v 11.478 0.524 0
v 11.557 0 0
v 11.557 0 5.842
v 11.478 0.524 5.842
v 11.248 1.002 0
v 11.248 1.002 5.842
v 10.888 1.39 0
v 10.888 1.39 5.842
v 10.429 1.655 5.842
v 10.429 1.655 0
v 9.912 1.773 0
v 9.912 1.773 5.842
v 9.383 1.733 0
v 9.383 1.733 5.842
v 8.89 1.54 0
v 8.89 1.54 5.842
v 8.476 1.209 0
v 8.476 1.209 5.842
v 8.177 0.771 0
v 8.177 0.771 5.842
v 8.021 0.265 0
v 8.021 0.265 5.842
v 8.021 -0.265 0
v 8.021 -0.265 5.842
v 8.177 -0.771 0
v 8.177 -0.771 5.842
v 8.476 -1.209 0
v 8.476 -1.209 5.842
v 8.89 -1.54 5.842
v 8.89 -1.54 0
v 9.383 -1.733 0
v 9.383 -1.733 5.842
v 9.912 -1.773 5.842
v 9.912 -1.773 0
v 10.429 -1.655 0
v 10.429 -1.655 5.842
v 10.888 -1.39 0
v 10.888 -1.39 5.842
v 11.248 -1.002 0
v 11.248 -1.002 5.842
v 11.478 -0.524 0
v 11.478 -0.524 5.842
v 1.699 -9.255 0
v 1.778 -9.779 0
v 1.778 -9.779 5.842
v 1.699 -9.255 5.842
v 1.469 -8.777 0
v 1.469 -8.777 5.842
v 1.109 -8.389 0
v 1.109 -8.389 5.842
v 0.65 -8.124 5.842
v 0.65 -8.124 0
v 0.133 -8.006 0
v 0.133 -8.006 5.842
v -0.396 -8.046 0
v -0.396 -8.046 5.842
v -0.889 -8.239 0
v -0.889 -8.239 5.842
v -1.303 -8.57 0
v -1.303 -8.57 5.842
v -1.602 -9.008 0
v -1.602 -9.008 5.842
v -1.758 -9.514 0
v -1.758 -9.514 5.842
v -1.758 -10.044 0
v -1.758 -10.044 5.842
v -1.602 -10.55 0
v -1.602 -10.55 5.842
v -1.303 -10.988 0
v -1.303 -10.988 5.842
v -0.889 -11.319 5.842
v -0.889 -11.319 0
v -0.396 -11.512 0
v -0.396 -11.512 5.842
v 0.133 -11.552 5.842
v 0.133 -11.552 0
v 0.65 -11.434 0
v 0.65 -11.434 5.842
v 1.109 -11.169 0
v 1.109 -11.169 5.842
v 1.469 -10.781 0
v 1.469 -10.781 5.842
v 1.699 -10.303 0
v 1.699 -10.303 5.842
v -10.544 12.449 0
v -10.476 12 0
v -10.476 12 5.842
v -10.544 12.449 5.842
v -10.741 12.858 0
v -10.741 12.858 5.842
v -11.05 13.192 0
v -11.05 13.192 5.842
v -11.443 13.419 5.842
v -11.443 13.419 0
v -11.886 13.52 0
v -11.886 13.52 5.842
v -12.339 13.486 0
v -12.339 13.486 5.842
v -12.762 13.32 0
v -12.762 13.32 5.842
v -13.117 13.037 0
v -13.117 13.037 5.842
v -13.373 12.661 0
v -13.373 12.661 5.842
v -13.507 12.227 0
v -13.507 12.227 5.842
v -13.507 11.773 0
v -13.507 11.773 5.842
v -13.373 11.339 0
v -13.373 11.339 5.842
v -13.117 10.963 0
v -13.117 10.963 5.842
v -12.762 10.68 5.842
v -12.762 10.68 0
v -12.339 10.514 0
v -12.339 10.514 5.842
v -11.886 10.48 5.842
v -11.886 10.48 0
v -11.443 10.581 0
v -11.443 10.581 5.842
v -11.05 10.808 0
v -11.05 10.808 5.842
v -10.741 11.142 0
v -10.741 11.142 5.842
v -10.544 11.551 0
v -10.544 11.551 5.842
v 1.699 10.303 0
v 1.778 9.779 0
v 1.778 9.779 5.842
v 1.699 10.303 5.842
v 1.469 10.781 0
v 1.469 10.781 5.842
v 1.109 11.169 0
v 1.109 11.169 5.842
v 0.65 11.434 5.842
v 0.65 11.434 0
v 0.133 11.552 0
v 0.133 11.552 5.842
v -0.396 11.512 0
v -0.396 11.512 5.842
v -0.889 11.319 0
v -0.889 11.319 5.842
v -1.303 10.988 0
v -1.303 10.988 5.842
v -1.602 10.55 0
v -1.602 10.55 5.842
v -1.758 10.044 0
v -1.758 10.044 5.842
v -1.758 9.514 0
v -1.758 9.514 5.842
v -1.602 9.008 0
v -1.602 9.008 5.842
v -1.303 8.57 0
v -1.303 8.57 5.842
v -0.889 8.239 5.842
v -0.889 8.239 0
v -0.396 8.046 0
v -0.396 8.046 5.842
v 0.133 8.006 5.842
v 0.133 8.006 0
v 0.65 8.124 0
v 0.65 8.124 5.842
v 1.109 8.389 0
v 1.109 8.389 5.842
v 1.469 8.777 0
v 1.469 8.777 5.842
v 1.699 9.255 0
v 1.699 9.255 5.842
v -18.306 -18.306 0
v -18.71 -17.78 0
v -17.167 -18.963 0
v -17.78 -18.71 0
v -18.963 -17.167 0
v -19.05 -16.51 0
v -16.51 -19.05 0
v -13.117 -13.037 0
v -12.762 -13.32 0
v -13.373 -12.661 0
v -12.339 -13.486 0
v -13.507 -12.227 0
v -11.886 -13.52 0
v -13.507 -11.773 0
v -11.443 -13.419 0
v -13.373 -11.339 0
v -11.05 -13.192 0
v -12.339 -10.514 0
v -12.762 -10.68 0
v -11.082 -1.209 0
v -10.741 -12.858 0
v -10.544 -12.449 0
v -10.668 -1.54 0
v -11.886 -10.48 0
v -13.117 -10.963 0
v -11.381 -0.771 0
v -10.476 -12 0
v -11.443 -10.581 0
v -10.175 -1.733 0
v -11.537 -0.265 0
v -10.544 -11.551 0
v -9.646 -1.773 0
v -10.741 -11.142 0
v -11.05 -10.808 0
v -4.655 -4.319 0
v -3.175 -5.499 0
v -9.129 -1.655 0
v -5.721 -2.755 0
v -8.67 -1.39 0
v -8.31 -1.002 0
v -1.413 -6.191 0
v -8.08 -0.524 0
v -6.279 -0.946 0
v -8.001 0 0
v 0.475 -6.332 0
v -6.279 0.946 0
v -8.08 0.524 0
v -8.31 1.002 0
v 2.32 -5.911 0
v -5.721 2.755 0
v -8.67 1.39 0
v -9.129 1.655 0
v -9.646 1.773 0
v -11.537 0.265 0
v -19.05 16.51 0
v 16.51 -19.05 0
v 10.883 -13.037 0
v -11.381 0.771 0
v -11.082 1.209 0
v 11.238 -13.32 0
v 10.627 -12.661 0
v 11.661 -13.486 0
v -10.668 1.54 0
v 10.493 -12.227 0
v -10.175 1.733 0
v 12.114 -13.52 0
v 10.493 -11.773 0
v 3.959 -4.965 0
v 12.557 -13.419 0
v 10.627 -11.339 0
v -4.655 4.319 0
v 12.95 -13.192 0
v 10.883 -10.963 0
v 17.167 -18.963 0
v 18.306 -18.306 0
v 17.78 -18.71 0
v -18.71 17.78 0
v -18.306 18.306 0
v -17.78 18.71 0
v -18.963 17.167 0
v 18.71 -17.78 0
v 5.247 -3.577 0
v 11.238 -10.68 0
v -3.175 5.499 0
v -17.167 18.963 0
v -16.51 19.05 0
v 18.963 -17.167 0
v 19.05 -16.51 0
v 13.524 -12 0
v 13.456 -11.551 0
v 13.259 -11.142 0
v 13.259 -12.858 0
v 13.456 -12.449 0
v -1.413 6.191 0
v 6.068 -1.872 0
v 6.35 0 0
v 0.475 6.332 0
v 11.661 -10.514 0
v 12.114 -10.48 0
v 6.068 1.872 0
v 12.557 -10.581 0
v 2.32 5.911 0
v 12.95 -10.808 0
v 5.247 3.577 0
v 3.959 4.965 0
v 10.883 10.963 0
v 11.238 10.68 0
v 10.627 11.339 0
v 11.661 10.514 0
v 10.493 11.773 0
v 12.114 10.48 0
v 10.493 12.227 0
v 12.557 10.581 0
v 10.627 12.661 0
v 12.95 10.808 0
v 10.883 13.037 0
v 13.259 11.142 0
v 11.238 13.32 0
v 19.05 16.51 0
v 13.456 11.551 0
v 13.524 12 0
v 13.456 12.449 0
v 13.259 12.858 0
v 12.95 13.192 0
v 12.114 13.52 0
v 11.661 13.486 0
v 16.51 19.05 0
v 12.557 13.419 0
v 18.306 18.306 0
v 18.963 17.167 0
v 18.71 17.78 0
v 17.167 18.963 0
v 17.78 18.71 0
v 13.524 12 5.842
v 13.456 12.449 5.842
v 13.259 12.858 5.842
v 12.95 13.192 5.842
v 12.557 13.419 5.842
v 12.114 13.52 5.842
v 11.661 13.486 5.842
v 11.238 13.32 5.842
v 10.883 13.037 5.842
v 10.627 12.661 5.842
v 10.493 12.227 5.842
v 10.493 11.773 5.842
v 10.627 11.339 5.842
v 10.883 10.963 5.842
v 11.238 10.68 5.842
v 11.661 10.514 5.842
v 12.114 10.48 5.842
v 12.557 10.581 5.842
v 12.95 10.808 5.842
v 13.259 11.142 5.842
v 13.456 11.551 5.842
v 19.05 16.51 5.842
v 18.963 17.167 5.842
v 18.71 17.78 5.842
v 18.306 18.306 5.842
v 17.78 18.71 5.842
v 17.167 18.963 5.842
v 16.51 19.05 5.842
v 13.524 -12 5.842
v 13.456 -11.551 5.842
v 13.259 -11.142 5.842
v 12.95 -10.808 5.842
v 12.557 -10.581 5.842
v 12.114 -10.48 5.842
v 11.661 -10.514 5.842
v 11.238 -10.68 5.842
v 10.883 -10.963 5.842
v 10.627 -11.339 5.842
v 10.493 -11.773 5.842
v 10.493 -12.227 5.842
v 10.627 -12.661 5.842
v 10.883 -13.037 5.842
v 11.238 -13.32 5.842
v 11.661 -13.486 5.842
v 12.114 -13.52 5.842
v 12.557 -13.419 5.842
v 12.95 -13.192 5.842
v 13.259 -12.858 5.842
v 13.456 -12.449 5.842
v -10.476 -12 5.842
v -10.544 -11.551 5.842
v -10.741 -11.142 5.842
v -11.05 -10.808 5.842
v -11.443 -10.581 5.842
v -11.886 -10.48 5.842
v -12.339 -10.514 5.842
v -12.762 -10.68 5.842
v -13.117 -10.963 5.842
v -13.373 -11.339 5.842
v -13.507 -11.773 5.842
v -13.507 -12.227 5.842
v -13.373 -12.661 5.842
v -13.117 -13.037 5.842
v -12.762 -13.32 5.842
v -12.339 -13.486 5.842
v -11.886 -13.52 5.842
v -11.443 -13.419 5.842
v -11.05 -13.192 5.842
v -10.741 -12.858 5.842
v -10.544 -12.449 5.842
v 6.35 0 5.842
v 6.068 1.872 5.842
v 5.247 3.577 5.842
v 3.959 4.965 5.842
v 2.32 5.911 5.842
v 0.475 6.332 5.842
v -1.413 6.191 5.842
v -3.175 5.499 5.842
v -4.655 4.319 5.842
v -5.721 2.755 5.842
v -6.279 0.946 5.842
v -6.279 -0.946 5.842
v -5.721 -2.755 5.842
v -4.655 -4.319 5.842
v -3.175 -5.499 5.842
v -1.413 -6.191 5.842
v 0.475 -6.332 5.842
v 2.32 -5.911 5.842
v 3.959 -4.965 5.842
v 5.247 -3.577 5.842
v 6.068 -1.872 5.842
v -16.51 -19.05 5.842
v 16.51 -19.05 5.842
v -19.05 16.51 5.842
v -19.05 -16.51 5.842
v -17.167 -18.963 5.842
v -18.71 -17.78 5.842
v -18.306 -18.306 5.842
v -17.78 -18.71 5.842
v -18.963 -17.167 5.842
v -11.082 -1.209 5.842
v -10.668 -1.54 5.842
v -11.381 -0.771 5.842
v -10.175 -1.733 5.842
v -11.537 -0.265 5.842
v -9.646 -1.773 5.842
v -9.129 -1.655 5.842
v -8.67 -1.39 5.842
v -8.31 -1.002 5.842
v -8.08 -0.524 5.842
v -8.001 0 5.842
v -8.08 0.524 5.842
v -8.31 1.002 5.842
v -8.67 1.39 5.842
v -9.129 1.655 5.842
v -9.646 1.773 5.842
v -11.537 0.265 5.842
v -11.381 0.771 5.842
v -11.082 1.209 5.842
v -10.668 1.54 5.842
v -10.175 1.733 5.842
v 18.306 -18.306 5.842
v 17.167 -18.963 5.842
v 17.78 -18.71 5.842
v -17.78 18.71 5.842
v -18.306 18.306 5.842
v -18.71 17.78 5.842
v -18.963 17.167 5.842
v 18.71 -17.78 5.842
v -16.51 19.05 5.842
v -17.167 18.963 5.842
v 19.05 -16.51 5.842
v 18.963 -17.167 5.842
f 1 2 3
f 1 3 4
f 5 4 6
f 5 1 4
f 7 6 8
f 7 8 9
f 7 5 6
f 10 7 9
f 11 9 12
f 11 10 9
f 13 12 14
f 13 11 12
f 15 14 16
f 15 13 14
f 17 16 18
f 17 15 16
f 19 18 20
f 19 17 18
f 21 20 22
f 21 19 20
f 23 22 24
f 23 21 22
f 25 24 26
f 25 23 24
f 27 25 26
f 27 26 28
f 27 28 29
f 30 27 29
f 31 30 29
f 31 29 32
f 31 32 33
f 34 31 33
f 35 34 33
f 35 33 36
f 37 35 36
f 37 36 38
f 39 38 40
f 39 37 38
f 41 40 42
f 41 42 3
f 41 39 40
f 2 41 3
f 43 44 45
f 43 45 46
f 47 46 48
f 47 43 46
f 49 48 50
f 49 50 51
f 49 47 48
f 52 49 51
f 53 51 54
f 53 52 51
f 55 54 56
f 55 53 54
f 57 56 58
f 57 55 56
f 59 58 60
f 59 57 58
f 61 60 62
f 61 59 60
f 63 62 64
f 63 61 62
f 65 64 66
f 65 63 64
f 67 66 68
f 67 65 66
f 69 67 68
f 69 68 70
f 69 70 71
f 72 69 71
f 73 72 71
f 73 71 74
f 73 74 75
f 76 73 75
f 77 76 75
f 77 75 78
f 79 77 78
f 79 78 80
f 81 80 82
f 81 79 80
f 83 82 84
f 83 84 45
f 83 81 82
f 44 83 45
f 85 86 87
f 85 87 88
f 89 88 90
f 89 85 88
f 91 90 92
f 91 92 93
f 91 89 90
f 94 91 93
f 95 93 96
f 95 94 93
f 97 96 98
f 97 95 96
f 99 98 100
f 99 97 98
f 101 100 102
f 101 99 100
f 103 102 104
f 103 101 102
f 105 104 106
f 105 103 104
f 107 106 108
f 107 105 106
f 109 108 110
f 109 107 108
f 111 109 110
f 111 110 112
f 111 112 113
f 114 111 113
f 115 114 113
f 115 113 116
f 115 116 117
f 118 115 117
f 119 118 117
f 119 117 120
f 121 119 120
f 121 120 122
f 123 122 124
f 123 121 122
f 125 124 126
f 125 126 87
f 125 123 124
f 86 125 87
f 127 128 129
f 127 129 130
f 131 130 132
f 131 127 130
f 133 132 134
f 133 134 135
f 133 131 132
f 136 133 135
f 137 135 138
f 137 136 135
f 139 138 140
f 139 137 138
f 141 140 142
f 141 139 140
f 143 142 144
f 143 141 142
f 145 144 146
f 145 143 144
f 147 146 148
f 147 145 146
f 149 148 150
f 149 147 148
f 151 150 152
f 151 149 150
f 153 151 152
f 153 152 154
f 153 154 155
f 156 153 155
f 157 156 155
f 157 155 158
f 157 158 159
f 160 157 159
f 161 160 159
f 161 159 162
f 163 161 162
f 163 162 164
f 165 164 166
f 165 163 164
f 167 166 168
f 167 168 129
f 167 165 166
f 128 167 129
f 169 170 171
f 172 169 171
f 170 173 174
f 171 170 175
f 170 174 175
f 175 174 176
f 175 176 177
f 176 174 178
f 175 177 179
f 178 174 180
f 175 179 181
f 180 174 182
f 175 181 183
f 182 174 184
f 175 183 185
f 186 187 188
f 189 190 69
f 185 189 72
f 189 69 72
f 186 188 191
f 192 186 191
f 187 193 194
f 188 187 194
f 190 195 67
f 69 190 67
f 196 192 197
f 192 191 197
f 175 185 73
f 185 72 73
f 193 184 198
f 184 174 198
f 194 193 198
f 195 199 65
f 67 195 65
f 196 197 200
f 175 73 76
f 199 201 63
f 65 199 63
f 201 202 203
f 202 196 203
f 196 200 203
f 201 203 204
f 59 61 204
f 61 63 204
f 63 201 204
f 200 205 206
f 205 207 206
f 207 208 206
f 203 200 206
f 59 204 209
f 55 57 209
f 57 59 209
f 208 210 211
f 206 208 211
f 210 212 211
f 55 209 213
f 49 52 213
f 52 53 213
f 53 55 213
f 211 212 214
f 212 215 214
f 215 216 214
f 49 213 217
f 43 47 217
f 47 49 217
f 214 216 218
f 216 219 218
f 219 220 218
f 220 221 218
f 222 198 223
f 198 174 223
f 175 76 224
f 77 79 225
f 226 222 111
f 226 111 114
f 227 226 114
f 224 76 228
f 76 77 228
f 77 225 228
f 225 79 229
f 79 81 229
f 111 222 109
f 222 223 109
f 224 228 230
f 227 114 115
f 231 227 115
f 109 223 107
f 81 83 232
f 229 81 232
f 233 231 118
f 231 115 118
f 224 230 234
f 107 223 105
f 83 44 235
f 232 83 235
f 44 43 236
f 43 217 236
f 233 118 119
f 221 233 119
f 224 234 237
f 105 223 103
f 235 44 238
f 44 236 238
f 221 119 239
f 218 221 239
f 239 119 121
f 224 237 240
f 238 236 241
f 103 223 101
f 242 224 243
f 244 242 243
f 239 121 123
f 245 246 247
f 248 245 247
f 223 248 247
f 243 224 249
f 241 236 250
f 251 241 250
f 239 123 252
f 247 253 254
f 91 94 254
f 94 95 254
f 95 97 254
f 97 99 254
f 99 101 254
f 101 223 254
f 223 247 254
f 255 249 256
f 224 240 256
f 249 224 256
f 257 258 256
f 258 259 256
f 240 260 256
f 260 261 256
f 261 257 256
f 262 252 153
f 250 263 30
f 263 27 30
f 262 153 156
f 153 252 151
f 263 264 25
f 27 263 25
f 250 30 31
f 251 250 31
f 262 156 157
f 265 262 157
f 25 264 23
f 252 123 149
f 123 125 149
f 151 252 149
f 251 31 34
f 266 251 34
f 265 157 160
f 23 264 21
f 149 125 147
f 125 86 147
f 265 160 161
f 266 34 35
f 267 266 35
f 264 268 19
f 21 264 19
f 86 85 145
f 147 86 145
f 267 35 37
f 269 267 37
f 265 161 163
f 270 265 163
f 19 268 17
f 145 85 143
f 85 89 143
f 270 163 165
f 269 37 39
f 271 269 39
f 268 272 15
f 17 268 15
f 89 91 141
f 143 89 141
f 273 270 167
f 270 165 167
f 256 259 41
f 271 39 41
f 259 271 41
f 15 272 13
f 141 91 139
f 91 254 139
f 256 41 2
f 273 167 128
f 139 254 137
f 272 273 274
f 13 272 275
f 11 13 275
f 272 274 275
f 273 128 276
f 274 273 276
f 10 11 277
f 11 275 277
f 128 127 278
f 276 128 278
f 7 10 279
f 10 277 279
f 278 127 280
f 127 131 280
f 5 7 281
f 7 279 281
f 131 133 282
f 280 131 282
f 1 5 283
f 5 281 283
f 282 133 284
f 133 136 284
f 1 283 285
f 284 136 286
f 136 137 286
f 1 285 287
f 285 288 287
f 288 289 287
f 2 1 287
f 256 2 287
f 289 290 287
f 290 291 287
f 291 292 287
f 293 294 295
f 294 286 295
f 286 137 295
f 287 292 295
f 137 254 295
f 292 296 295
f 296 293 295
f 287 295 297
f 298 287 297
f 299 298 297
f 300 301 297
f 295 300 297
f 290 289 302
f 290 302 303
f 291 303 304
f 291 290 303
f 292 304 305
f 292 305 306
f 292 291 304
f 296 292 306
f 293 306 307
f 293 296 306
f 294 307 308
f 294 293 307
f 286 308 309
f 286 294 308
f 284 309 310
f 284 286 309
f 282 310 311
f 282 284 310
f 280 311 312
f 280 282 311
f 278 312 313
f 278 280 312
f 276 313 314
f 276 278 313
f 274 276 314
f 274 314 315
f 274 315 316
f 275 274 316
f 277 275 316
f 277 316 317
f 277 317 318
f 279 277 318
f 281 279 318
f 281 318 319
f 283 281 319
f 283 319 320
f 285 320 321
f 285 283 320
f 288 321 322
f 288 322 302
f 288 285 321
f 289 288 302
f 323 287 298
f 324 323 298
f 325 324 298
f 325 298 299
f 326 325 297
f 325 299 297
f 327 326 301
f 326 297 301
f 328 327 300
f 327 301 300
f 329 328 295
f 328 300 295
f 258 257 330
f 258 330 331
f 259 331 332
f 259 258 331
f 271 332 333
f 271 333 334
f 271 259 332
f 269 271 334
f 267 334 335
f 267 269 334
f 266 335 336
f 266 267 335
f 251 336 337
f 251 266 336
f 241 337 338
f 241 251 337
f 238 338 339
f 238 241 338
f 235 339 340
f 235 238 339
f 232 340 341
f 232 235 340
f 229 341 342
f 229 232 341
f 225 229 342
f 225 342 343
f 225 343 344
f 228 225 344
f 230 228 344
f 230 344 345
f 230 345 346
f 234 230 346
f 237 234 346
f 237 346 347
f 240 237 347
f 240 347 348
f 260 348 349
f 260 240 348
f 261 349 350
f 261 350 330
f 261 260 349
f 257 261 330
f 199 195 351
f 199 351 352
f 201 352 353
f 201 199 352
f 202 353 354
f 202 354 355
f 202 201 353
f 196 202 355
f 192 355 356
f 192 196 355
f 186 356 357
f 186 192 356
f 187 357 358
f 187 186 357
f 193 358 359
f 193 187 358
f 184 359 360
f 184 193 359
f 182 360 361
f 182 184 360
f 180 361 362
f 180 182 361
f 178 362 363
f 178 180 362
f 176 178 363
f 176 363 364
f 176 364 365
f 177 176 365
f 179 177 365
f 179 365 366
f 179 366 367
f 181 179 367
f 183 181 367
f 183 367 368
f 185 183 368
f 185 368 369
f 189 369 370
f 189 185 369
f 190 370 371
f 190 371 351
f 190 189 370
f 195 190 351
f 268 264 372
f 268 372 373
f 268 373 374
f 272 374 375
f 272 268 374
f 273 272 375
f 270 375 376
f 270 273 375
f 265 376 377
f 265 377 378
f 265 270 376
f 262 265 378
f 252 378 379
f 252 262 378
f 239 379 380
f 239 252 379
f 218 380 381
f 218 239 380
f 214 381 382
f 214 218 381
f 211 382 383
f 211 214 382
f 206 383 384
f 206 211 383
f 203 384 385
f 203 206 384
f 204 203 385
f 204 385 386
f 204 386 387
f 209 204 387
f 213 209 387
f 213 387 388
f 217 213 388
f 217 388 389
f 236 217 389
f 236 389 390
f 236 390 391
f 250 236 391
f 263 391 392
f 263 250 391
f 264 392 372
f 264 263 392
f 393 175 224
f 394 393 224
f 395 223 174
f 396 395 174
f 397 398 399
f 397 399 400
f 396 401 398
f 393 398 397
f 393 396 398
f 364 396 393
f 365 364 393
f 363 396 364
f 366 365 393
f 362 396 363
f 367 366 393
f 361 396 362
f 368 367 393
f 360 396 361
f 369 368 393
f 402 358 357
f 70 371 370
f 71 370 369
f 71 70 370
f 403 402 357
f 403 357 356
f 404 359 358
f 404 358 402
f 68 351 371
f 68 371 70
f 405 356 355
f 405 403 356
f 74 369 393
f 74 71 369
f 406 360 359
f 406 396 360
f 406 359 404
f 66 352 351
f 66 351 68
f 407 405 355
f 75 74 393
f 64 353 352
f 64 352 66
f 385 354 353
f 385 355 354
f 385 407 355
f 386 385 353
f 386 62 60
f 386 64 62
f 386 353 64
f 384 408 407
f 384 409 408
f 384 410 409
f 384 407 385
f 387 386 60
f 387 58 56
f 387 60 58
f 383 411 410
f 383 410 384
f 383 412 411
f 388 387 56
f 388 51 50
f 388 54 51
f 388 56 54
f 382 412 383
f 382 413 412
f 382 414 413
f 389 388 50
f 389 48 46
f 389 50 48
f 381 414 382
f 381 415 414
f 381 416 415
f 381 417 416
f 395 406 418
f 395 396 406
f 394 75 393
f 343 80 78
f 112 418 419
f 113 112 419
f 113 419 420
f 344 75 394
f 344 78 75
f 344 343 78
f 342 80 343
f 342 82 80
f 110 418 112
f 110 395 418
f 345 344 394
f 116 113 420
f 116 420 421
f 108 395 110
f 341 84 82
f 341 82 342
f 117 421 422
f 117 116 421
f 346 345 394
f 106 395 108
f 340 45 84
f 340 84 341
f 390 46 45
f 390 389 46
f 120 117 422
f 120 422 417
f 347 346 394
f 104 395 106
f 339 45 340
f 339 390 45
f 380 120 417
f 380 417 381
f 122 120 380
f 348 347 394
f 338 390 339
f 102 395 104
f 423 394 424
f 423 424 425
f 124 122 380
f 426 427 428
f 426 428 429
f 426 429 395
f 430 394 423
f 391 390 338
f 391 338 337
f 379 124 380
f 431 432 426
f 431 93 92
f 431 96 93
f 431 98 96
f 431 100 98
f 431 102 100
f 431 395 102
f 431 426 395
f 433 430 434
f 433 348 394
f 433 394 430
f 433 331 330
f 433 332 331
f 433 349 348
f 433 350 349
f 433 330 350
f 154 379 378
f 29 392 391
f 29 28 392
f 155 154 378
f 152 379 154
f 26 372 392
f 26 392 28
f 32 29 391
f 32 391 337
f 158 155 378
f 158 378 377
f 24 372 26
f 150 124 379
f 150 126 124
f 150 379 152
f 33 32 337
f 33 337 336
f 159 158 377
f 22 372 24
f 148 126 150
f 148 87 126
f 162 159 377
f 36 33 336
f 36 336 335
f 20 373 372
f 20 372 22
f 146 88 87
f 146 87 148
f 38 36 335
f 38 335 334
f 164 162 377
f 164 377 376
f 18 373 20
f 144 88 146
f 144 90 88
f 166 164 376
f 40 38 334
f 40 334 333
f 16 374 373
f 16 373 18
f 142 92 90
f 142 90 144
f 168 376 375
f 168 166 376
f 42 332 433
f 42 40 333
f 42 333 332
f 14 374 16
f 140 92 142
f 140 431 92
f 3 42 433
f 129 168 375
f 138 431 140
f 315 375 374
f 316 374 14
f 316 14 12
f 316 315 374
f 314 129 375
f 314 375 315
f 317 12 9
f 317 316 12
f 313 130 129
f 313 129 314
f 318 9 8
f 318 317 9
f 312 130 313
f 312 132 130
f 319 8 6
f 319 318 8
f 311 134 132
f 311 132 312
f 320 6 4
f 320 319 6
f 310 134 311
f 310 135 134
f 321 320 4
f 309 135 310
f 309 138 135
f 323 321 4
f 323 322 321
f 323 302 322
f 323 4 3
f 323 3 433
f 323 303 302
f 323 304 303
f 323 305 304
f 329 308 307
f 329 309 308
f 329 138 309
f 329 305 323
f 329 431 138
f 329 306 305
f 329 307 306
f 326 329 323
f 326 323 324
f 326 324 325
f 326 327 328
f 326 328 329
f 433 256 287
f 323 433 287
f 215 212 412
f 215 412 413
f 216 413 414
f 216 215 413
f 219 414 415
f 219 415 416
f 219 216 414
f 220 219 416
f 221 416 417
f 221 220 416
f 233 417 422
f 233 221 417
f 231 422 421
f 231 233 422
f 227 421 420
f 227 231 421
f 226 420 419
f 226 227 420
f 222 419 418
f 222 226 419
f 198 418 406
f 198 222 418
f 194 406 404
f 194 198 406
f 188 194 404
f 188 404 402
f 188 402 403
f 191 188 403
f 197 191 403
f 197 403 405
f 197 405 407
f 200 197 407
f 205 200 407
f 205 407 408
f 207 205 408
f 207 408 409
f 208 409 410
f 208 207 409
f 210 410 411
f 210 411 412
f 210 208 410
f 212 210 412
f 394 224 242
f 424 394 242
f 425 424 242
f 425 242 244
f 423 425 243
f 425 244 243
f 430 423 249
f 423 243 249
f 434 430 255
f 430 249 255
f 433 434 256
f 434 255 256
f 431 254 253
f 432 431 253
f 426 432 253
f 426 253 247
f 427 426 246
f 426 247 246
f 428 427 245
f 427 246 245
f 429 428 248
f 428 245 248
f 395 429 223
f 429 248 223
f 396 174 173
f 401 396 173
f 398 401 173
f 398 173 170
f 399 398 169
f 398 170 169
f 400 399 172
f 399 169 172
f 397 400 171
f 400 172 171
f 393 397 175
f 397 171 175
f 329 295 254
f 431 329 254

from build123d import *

# Parameters (mm, degrees)
F0_R     = 1.524
F0_R_2   = 1.778
F0_R_3   = 6.35
F1_DEPTH = 5.842


with BuildPart() as f1:
    # F0 (on Top) → F1 (new body)
    with BuildSketch(Plane.XY):
        with BuildLine():
            Line((16.51, 19.05), (-16.51, 19.05))
            ThreePointArc((-16.51, 19.05), (-18.306051, 18.306051), (-19.05, 16.51))
            Line((-19.05, 16.51), (-19.05, -16.51))
            ThreePointArc((-19.05, -16.51), (-18.306051, -18.306051), (-16.51, -19.05))
            Line((-16.51, -19.05), (16.51, -19.05))
            ThreePointArc((16.51, -19.05), (18.306051, -18.306051), (19.05, -16.51))
            Line((19.05, -16.51), (19.05, 16.51))
            ThreePointArc((19.05, 16.51), (18.306051, 18.306051), (16.51, 19.05))
        make_face()
        with Locations((-12, -12)):
            Circle(F0_R, mode=Mode.SUBTRACT)
        with Locations((0, -9.779)):
            Circle(F0_R_2, mode=Mode.SUBTRACT)
        with Locations((12, -12)):
            Circle(F0_R, mode=Mode.SUBTRACT)
        with Locations((-9.779, 0)):
            Circle(F0_R_2, mode=Mode.SUBTRACT)
        with Locations((-12, 12)):
            Circle(F0_R, mode=Mode.SUBTRACT)
        Circle(F0_R_3, mode=Mode.SUBTRACT)
        with Locations((9.779, 0)):
            Circle(F0_R_2, mode=Mode.SUBTRACT)
        with Locations((0, 9.779)):
            Circle(F0_R_2, mode=Mode.SUBTRACT)
        with Locations((12, 12)):
            Circle(F0_R, mode=Mode.SUBTRACT)
    extrude(amount=F1_DEPTH)


solid = f1.part
